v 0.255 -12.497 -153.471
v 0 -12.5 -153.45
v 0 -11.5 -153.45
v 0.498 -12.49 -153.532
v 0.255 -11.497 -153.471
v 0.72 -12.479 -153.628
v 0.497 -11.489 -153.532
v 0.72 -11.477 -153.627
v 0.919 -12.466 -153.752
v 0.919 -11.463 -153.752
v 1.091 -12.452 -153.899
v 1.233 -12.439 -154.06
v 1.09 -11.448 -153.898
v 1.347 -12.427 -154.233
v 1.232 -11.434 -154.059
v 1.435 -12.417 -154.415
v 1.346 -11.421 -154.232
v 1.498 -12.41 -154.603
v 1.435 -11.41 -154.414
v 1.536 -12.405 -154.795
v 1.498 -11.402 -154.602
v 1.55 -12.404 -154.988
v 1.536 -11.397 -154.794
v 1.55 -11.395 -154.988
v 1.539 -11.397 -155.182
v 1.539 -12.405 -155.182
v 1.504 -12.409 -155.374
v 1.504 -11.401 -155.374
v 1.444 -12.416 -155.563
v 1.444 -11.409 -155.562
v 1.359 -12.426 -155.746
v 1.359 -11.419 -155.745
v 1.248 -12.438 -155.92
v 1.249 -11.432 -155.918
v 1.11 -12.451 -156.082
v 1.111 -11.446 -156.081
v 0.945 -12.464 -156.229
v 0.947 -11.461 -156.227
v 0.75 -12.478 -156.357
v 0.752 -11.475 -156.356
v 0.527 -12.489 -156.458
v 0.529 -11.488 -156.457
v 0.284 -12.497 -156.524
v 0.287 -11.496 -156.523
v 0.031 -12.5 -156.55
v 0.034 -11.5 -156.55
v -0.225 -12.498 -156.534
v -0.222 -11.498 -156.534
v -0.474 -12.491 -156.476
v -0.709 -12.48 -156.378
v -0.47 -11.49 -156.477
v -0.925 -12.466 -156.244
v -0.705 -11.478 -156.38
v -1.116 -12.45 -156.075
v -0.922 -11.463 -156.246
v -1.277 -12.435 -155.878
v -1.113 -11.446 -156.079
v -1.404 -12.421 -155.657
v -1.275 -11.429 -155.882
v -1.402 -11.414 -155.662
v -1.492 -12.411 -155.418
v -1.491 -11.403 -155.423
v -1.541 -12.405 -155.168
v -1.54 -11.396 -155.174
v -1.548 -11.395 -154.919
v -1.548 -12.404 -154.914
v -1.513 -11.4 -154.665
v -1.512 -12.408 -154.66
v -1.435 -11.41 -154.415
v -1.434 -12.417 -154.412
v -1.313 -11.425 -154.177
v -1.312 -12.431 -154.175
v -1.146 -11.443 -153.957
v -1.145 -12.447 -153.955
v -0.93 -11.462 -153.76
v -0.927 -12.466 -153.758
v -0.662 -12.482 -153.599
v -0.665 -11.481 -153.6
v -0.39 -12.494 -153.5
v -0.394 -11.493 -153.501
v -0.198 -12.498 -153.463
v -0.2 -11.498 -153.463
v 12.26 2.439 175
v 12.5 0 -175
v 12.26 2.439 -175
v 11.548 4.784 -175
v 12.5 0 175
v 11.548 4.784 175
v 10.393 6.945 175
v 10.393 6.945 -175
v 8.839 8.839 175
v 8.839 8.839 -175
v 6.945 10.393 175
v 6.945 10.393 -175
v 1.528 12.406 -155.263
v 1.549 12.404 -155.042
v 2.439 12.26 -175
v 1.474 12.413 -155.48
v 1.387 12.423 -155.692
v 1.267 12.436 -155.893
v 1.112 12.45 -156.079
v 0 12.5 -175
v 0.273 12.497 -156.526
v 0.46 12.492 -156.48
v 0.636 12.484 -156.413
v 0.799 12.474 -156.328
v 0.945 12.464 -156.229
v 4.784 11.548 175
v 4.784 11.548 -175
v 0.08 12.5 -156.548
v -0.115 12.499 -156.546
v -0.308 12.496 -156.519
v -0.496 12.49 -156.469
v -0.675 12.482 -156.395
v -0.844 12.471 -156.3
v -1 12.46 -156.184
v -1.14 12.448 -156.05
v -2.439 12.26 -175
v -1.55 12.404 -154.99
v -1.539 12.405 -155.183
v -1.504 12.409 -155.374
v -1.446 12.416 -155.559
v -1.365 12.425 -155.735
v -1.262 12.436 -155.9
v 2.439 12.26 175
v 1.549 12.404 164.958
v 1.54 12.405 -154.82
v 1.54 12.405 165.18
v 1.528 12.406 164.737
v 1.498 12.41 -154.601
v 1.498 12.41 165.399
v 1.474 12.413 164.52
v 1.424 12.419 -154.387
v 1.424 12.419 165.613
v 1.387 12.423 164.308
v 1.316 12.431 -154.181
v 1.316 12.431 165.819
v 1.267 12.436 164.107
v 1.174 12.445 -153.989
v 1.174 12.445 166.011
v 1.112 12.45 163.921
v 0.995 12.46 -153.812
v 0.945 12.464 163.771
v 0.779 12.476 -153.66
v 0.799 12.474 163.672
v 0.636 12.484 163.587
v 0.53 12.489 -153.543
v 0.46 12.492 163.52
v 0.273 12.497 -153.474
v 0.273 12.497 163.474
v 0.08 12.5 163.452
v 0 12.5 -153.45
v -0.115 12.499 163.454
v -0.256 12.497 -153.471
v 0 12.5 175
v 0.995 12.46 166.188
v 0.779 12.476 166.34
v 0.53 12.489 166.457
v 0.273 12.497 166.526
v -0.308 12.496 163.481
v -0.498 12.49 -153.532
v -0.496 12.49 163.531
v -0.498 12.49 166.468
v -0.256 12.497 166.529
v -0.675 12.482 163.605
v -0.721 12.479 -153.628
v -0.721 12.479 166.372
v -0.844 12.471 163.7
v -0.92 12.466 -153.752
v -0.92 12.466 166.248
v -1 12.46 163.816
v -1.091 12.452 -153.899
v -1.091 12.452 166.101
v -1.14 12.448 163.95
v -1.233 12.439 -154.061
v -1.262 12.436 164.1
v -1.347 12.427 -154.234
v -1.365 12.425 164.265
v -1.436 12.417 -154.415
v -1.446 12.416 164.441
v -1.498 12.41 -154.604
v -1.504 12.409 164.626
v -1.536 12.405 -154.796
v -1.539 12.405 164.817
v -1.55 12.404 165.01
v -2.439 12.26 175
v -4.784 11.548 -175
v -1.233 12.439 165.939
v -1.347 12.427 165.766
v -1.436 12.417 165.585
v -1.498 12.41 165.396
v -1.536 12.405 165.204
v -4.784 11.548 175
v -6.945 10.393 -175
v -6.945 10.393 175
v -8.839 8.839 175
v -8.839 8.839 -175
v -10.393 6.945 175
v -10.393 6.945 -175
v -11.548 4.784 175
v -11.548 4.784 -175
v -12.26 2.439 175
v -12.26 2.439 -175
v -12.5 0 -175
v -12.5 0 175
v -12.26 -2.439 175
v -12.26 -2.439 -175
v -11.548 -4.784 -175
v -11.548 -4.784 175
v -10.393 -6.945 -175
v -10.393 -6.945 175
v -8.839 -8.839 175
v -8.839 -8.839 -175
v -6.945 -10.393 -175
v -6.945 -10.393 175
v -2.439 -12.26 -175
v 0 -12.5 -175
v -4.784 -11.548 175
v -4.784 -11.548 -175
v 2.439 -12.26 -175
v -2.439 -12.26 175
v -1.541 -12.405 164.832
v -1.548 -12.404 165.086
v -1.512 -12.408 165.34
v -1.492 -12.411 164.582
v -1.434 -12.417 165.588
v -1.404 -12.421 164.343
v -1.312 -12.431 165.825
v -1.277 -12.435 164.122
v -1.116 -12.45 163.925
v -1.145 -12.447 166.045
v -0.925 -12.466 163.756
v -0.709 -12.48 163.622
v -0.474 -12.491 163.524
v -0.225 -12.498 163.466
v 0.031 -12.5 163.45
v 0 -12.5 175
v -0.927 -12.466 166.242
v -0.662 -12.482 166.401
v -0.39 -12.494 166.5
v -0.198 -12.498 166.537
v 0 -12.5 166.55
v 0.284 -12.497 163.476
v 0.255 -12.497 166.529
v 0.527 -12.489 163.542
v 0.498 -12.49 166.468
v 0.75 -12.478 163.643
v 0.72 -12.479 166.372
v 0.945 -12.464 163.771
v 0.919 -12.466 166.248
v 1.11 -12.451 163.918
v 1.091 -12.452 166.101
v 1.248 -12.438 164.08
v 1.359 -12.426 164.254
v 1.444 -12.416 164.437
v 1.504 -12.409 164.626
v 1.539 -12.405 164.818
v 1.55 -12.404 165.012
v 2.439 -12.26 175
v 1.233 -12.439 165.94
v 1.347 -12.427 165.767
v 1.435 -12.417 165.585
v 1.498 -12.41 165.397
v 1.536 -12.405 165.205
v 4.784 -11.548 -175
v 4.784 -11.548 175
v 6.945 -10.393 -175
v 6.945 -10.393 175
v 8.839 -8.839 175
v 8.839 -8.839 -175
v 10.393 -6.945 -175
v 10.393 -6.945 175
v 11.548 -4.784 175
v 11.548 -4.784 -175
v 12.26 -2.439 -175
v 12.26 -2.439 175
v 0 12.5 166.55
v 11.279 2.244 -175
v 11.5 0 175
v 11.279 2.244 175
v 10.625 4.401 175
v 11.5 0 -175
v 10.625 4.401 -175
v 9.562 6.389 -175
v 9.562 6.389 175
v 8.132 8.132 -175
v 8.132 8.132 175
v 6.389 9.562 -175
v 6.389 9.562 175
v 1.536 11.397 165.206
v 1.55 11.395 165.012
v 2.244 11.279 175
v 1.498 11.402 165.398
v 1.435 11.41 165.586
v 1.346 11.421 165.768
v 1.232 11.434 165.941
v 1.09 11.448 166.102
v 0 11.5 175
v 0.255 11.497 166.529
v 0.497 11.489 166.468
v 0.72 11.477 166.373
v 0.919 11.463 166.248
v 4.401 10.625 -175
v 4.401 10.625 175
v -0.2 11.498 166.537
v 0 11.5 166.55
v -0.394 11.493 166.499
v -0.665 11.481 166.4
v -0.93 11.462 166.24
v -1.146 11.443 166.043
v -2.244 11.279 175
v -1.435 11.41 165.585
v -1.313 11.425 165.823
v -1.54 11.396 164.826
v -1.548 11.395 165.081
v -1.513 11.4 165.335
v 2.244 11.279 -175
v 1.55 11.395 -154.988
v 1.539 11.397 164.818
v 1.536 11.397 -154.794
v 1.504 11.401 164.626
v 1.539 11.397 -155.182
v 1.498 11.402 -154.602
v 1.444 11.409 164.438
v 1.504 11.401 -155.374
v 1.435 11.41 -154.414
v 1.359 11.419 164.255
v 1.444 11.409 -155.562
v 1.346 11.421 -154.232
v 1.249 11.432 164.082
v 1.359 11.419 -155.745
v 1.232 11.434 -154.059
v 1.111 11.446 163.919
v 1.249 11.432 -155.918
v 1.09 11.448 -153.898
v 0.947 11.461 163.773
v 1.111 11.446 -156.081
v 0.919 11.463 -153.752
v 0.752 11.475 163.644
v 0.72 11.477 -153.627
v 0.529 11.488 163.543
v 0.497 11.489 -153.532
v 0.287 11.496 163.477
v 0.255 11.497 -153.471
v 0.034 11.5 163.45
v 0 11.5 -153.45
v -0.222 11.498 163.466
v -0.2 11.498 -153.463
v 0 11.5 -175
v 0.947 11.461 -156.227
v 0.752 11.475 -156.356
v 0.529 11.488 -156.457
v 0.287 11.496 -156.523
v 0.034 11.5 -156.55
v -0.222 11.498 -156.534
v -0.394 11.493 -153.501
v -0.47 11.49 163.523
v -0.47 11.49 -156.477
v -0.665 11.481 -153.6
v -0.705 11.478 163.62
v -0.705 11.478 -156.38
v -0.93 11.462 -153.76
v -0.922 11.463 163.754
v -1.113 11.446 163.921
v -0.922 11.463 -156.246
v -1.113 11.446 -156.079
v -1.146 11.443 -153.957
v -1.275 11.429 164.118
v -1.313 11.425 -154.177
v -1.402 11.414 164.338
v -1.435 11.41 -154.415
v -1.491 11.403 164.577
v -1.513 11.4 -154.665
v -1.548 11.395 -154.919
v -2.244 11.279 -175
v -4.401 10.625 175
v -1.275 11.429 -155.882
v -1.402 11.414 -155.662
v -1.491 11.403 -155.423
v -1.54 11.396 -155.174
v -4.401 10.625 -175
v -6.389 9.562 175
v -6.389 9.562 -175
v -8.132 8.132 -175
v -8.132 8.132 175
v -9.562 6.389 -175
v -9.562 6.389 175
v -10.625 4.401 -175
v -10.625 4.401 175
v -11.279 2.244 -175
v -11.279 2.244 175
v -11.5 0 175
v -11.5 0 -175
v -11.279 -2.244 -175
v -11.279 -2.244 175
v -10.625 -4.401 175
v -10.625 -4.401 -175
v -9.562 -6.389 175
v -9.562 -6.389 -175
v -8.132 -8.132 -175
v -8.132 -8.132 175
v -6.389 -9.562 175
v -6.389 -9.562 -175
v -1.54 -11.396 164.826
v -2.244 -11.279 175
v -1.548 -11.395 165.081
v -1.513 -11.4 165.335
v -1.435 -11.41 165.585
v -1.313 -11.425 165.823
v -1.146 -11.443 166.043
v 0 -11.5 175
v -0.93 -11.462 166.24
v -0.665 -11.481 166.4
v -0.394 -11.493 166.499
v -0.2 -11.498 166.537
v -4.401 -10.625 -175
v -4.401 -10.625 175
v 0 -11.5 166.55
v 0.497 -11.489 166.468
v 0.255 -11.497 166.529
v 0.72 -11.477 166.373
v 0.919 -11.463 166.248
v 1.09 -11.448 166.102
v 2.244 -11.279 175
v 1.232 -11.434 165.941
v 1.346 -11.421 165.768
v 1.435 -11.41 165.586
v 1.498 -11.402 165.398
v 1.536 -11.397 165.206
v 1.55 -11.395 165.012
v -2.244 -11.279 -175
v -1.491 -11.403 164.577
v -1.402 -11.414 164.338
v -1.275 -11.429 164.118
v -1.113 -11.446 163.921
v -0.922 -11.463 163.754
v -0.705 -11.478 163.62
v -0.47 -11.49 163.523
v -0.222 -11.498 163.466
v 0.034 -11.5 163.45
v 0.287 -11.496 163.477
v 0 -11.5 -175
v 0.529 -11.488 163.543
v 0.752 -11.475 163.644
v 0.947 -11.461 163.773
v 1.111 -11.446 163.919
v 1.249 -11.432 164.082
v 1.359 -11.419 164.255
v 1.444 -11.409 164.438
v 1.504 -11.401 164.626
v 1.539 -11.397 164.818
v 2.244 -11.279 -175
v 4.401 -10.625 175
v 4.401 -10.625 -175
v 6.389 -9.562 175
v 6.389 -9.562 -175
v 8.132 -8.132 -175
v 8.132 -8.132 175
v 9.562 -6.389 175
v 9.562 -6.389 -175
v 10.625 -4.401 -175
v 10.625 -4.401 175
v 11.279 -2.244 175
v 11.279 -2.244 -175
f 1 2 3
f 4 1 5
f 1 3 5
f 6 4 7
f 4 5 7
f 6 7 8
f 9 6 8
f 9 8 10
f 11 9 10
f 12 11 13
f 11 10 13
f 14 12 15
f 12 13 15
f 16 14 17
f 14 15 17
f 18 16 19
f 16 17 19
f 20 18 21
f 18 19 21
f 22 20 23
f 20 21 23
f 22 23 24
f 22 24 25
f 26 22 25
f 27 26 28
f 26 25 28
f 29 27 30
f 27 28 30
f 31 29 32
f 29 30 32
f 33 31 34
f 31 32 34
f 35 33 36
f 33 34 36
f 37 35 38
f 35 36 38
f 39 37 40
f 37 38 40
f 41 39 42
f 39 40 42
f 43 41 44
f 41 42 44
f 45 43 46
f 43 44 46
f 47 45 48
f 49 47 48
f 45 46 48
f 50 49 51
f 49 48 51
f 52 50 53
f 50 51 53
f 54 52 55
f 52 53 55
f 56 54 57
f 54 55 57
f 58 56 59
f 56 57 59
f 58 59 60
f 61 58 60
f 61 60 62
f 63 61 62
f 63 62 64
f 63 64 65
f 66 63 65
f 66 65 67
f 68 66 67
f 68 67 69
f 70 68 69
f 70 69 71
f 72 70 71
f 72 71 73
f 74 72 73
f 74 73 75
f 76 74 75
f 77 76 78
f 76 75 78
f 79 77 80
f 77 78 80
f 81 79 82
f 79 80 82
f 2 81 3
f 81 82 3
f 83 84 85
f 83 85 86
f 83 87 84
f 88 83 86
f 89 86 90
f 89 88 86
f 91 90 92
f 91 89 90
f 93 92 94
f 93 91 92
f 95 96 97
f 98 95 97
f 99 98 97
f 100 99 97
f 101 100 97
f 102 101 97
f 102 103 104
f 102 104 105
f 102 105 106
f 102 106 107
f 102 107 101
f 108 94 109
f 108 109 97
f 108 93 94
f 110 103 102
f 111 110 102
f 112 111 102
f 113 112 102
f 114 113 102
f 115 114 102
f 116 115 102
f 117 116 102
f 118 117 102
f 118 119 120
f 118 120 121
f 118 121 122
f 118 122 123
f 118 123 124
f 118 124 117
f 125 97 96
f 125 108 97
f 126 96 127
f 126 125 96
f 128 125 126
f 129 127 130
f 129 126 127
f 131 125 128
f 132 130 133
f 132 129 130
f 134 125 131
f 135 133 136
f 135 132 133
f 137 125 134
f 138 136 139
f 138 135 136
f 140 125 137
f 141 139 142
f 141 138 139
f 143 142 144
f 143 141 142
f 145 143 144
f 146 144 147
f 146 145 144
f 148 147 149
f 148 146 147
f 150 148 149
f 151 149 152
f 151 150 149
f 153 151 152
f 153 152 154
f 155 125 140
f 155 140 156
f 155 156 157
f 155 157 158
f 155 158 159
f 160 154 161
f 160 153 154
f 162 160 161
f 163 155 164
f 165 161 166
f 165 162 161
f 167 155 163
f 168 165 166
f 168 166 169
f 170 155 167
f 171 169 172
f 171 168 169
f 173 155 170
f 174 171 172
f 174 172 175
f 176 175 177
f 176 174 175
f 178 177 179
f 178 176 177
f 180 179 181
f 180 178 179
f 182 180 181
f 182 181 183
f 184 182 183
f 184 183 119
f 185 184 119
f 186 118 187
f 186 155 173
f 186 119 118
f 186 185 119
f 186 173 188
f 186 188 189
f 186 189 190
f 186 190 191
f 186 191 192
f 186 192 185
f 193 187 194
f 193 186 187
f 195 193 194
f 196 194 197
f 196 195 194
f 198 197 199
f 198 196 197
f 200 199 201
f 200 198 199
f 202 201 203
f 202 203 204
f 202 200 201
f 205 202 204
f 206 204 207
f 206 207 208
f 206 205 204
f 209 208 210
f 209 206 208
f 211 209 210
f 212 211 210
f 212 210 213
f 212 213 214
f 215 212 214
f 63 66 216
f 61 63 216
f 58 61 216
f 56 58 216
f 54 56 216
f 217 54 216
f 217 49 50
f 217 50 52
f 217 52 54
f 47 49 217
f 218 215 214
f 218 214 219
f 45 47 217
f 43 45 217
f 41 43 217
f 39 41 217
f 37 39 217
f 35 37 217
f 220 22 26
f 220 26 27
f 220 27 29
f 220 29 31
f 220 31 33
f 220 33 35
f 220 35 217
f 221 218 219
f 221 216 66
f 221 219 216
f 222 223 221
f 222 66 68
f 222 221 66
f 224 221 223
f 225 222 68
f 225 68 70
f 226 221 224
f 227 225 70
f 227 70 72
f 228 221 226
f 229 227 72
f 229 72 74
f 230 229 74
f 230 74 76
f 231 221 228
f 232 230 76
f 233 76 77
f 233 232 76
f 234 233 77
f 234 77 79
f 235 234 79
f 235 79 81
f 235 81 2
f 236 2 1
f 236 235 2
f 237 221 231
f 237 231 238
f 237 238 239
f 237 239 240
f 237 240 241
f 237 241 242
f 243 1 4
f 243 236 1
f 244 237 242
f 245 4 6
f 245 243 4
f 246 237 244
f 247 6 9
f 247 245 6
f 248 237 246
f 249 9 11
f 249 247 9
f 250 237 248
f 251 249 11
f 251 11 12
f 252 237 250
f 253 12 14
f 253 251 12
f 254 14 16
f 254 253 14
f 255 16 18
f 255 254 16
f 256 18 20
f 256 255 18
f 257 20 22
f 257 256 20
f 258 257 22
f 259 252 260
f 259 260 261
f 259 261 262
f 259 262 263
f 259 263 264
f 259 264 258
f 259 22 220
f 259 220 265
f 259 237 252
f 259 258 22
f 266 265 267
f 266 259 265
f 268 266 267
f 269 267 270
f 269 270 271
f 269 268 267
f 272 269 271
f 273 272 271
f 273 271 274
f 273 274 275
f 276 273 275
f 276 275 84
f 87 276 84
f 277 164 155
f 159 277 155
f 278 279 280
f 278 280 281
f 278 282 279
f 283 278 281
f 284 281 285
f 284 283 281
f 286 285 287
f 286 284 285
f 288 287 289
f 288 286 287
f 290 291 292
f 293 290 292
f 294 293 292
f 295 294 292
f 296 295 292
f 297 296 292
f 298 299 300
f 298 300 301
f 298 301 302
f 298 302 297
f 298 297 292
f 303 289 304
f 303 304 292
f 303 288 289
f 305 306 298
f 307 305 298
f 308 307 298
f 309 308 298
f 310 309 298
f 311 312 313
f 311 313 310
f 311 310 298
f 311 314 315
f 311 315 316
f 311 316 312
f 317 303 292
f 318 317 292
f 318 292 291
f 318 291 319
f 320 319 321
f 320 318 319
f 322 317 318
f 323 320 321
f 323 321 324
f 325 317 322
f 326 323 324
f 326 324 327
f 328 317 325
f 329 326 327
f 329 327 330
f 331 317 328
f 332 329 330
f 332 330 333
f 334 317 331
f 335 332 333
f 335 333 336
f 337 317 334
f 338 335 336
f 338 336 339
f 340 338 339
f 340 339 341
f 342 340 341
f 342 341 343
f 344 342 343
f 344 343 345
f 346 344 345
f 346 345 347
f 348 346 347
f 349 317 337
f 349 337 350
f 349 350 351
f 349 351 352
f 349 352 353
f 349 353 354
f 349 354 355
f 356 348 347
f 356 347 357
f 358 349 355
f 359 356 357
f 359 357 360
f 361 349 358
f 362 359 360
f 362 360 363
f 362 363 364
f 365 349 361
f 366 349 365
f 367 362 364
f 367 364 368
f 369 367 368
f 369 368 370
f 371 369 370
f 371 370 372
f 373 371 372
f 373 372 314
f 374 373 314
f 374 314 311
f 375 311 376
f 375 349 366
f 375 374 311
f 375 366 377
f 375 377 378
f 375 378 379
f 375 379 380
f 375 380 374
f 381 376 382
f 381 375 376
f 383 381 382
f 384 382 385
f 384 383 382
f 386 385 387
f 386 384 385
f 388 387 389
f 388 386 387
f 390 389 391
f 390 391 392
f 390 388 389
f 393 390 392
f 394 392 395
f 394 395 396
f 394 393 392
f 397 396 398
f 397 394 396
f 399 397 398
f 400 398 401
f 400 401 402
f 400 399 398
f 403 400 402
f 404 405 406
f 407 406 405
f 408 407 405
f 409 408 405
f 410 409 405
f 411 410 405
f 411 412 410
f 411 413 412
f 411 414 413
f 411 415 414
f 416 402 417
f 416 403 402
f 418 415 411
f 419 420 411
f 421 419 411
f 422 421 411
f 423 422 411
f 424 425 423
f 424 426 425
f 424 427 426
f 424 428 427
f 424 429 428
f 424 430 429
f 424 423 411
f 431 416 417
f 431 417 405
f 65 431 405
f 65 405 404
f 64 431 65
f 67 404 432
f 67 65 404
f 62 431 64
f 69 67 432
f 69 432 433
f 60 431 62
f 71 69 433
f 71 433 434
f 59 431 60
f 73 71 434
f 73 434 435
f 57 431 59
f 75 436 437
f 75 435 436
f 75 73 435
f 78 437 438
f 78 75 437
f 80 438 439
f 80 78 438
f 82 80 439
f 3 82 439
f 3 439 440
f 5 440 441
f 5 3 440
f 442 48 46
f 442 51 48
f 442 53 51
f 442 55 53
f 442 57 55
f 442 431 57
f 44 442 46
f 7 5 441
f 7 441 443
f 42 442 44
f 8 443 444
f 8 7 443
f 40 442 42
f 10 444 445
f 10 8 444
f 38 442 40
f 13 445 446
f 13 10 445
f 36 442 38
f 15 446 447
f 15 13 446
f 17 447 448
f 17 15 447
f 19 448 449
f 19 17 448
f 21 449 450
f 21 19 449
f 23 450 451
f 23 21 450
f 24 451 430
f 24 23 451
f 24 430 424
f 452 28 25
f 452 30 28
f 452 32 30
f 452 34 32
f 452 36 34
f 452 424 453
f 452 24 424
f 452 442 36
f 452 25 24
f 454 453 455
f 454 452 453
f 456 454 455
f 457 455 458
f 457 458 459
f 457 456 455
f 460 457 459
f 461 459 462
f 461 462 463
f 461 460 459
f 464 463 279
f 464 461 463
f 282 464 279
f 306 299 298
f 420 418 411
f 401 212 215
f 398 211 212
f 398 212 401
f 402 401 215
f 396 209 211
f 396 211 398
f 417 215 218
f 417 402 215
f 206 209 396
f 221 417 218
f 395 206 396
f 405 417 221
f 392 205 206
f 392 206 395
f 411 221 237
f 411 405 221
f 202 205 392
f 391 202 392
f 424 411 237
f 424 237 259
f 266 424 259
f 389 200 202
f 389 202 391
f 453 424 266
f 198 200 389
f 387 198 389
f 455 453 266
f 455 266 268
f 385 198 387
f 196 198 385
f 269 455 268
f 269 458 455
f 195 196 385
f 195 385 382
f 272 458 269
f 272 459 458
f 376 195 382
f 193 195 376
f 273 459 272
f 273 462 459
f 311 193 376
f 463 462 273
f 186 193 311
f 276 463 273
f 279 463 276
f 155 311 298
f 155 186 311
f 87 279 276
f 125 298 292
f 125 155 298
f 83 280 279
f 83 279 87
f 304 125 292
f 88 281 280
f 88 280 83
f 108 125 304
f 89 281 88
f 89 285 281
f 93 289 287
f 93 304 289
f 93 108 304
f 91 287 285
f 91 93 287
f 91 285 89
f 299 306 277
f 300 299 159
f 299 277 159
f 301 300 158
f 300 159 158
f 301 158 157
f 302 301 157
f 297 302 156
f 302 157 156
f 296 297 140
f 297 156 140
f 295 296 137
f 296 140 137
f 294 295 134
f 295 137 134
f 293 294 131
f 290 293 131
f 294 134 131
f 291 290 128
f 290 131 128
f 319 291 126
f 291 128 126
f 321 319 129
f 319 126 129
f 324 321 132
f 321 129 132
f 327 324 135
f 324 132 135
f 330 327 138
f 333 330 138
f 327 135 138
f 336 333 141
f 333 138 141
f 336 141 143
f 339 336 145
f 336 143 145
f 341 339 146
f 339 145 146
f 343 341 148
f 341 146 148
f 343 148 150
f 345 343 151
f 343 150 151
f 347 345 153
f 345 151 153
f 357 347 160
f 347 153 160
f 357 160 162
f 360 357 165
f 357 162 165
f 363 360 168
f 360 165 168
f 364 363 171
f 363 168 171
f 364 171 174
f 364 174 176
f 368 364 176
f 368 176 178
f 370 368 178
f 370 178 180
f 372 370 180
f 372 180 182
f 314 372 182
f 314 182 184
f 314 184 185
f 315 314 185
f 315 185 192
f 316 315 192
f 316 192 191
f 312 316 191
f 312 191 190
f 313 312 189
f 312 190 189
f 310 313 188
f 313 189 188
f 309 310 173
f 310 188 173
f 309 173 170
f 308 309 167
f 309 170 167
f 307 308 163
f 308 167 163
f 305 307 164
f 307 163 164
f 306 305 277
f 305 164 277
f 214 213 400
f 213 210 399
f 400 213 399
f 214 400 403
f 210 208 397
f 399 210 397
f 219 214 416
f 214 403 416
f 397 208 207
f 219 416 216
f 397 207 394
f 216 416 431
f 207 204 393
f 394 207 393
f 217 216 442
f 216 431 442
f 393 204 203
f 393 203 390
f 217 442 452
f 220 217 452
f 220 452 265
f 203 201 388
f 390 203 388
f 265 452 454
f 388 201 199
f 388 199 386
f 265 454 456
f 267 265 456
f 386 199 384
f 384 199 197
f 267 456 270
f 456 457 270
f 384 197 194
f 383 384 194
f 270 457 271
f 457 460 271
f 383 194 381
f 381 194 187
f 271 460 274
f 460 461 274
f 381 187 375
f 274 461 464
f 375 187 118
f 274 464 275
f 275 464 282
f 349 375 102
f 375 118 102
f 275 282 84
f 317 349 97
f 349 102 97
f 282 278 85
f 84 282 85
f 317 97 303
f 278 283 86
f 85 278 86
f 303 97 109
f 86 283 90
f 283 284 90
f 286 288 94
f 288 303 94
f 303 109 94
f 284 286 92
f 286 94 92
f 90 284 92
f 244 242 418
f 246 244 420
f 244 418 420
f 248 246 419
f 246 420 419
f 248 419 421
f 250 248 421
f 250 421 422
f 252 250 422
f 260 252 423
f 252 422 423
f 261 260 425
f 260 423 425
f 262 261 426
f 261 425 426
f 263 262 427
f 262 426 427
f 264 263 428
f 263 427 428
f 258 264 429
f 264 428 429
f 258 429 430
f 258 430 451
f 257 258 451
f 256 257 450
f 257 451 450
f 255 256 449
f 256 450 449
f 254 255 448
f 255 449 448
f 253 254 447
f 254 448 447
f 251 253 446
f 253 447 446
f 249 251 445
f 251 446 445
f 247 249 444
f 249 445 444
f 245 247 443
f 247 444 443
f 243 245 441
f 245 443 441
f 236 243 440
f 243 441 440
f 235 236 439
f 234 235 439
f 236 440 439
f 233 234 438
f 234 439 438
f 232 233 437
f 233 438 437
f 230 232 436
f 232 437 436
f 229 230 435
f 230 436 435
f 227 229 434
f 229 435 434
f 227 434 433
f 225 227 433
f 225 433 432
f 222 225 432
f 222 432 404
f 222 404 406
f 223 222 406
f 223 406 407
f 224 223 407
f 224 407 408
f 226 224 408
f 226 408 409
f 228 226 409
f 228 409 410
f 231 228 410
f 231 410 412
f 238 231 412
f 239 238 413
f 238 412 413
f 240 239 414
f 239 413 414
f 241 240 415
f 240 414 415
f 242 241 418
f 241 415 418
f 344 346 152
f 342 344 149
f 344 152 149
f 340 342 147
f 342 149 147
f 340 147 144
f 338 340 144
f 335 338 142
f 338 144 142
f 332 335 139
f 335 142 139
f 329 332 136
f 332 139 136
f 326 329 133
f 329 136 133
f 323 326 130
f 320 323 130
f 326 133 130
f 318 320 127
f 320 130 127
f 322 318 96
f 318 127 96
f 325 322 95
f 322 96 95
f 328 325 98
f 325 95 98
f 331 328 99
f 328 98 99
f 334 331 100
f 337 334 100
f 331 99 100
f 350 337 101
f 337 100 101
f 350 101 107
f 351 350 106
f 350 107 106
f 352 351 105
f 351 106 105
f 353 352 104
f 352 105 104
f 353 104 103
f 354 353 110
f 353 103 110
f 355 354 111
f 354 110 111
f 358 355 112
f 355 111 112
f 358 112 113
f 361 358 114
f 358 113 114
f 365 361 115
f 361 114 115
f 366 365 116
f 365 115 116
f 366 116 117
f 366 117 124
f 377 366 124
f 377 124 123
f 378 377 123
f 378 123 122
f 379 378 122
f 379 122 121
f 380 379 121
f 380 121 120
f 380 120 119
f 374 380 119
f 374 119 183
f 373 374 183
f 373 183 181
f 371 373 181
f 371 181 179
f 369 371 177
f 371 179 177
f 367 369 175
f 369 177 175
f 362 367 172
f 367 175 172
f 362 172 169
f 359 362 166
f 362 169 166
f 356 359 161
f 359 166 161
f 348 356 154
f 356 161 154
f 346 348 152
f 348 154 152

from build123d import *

# Parameters (mm, degrees)
SKETCH1_R           = 12.5
SKETCH1_R_2         = 11.5
BOSS_EXTRUDE1_DEPTH = 175
SKETCH2_R           = 1.55
CUT_EXTRUDE1_DEPTH  = 12.5
SKETCH3_R           = 1.55
CUT_EXTRUDE2_DEPTH  = 12.5


with BuildPart() as part:
    # Sketch1 → Boss-Extrude1 (new, symmetric)
    with BuildSketch(Plane.XY):
        Circle(SKETCH1_R)
        Circle(SKETCH1_R_2, mode=Mode.SUBTRACT)
    extrude(amount=BOSS_EXTRUDE1_DEPTH, both=True)

    # Sketch2 → Cut-Extrude1 (cut, symmetric)
    with BuildSketch(Plane(origin=(0, 0, 0), x_dir=(1, 0, 0), z_dir=(0, 1, 0))):
        with Locations(Location((0, 155, 0), (0, 0, 270))):
            Circle(SKETCH2_R)
    extrude(amount=CUT_EXTRUDE1_DEPTH, both=True, mode=Mode.SUBTRACT)

    # Sketch3 → Cut-Extrude2 (cut, symmetric)
    with BuildSketch(Plane(origin=(0, 0, 0), x_dir=(1, 0, 0), z_dir=(0, 1, 0))):
        with Locations(Location((0, -165, 0), (0, 0, 270))):
            Circle(SKETCH3_R)
    extrude(amount=CUT_EXTRUDE2_DEPTH, both=True, mode=Mode.SUBTRACT)


solid = part.part
